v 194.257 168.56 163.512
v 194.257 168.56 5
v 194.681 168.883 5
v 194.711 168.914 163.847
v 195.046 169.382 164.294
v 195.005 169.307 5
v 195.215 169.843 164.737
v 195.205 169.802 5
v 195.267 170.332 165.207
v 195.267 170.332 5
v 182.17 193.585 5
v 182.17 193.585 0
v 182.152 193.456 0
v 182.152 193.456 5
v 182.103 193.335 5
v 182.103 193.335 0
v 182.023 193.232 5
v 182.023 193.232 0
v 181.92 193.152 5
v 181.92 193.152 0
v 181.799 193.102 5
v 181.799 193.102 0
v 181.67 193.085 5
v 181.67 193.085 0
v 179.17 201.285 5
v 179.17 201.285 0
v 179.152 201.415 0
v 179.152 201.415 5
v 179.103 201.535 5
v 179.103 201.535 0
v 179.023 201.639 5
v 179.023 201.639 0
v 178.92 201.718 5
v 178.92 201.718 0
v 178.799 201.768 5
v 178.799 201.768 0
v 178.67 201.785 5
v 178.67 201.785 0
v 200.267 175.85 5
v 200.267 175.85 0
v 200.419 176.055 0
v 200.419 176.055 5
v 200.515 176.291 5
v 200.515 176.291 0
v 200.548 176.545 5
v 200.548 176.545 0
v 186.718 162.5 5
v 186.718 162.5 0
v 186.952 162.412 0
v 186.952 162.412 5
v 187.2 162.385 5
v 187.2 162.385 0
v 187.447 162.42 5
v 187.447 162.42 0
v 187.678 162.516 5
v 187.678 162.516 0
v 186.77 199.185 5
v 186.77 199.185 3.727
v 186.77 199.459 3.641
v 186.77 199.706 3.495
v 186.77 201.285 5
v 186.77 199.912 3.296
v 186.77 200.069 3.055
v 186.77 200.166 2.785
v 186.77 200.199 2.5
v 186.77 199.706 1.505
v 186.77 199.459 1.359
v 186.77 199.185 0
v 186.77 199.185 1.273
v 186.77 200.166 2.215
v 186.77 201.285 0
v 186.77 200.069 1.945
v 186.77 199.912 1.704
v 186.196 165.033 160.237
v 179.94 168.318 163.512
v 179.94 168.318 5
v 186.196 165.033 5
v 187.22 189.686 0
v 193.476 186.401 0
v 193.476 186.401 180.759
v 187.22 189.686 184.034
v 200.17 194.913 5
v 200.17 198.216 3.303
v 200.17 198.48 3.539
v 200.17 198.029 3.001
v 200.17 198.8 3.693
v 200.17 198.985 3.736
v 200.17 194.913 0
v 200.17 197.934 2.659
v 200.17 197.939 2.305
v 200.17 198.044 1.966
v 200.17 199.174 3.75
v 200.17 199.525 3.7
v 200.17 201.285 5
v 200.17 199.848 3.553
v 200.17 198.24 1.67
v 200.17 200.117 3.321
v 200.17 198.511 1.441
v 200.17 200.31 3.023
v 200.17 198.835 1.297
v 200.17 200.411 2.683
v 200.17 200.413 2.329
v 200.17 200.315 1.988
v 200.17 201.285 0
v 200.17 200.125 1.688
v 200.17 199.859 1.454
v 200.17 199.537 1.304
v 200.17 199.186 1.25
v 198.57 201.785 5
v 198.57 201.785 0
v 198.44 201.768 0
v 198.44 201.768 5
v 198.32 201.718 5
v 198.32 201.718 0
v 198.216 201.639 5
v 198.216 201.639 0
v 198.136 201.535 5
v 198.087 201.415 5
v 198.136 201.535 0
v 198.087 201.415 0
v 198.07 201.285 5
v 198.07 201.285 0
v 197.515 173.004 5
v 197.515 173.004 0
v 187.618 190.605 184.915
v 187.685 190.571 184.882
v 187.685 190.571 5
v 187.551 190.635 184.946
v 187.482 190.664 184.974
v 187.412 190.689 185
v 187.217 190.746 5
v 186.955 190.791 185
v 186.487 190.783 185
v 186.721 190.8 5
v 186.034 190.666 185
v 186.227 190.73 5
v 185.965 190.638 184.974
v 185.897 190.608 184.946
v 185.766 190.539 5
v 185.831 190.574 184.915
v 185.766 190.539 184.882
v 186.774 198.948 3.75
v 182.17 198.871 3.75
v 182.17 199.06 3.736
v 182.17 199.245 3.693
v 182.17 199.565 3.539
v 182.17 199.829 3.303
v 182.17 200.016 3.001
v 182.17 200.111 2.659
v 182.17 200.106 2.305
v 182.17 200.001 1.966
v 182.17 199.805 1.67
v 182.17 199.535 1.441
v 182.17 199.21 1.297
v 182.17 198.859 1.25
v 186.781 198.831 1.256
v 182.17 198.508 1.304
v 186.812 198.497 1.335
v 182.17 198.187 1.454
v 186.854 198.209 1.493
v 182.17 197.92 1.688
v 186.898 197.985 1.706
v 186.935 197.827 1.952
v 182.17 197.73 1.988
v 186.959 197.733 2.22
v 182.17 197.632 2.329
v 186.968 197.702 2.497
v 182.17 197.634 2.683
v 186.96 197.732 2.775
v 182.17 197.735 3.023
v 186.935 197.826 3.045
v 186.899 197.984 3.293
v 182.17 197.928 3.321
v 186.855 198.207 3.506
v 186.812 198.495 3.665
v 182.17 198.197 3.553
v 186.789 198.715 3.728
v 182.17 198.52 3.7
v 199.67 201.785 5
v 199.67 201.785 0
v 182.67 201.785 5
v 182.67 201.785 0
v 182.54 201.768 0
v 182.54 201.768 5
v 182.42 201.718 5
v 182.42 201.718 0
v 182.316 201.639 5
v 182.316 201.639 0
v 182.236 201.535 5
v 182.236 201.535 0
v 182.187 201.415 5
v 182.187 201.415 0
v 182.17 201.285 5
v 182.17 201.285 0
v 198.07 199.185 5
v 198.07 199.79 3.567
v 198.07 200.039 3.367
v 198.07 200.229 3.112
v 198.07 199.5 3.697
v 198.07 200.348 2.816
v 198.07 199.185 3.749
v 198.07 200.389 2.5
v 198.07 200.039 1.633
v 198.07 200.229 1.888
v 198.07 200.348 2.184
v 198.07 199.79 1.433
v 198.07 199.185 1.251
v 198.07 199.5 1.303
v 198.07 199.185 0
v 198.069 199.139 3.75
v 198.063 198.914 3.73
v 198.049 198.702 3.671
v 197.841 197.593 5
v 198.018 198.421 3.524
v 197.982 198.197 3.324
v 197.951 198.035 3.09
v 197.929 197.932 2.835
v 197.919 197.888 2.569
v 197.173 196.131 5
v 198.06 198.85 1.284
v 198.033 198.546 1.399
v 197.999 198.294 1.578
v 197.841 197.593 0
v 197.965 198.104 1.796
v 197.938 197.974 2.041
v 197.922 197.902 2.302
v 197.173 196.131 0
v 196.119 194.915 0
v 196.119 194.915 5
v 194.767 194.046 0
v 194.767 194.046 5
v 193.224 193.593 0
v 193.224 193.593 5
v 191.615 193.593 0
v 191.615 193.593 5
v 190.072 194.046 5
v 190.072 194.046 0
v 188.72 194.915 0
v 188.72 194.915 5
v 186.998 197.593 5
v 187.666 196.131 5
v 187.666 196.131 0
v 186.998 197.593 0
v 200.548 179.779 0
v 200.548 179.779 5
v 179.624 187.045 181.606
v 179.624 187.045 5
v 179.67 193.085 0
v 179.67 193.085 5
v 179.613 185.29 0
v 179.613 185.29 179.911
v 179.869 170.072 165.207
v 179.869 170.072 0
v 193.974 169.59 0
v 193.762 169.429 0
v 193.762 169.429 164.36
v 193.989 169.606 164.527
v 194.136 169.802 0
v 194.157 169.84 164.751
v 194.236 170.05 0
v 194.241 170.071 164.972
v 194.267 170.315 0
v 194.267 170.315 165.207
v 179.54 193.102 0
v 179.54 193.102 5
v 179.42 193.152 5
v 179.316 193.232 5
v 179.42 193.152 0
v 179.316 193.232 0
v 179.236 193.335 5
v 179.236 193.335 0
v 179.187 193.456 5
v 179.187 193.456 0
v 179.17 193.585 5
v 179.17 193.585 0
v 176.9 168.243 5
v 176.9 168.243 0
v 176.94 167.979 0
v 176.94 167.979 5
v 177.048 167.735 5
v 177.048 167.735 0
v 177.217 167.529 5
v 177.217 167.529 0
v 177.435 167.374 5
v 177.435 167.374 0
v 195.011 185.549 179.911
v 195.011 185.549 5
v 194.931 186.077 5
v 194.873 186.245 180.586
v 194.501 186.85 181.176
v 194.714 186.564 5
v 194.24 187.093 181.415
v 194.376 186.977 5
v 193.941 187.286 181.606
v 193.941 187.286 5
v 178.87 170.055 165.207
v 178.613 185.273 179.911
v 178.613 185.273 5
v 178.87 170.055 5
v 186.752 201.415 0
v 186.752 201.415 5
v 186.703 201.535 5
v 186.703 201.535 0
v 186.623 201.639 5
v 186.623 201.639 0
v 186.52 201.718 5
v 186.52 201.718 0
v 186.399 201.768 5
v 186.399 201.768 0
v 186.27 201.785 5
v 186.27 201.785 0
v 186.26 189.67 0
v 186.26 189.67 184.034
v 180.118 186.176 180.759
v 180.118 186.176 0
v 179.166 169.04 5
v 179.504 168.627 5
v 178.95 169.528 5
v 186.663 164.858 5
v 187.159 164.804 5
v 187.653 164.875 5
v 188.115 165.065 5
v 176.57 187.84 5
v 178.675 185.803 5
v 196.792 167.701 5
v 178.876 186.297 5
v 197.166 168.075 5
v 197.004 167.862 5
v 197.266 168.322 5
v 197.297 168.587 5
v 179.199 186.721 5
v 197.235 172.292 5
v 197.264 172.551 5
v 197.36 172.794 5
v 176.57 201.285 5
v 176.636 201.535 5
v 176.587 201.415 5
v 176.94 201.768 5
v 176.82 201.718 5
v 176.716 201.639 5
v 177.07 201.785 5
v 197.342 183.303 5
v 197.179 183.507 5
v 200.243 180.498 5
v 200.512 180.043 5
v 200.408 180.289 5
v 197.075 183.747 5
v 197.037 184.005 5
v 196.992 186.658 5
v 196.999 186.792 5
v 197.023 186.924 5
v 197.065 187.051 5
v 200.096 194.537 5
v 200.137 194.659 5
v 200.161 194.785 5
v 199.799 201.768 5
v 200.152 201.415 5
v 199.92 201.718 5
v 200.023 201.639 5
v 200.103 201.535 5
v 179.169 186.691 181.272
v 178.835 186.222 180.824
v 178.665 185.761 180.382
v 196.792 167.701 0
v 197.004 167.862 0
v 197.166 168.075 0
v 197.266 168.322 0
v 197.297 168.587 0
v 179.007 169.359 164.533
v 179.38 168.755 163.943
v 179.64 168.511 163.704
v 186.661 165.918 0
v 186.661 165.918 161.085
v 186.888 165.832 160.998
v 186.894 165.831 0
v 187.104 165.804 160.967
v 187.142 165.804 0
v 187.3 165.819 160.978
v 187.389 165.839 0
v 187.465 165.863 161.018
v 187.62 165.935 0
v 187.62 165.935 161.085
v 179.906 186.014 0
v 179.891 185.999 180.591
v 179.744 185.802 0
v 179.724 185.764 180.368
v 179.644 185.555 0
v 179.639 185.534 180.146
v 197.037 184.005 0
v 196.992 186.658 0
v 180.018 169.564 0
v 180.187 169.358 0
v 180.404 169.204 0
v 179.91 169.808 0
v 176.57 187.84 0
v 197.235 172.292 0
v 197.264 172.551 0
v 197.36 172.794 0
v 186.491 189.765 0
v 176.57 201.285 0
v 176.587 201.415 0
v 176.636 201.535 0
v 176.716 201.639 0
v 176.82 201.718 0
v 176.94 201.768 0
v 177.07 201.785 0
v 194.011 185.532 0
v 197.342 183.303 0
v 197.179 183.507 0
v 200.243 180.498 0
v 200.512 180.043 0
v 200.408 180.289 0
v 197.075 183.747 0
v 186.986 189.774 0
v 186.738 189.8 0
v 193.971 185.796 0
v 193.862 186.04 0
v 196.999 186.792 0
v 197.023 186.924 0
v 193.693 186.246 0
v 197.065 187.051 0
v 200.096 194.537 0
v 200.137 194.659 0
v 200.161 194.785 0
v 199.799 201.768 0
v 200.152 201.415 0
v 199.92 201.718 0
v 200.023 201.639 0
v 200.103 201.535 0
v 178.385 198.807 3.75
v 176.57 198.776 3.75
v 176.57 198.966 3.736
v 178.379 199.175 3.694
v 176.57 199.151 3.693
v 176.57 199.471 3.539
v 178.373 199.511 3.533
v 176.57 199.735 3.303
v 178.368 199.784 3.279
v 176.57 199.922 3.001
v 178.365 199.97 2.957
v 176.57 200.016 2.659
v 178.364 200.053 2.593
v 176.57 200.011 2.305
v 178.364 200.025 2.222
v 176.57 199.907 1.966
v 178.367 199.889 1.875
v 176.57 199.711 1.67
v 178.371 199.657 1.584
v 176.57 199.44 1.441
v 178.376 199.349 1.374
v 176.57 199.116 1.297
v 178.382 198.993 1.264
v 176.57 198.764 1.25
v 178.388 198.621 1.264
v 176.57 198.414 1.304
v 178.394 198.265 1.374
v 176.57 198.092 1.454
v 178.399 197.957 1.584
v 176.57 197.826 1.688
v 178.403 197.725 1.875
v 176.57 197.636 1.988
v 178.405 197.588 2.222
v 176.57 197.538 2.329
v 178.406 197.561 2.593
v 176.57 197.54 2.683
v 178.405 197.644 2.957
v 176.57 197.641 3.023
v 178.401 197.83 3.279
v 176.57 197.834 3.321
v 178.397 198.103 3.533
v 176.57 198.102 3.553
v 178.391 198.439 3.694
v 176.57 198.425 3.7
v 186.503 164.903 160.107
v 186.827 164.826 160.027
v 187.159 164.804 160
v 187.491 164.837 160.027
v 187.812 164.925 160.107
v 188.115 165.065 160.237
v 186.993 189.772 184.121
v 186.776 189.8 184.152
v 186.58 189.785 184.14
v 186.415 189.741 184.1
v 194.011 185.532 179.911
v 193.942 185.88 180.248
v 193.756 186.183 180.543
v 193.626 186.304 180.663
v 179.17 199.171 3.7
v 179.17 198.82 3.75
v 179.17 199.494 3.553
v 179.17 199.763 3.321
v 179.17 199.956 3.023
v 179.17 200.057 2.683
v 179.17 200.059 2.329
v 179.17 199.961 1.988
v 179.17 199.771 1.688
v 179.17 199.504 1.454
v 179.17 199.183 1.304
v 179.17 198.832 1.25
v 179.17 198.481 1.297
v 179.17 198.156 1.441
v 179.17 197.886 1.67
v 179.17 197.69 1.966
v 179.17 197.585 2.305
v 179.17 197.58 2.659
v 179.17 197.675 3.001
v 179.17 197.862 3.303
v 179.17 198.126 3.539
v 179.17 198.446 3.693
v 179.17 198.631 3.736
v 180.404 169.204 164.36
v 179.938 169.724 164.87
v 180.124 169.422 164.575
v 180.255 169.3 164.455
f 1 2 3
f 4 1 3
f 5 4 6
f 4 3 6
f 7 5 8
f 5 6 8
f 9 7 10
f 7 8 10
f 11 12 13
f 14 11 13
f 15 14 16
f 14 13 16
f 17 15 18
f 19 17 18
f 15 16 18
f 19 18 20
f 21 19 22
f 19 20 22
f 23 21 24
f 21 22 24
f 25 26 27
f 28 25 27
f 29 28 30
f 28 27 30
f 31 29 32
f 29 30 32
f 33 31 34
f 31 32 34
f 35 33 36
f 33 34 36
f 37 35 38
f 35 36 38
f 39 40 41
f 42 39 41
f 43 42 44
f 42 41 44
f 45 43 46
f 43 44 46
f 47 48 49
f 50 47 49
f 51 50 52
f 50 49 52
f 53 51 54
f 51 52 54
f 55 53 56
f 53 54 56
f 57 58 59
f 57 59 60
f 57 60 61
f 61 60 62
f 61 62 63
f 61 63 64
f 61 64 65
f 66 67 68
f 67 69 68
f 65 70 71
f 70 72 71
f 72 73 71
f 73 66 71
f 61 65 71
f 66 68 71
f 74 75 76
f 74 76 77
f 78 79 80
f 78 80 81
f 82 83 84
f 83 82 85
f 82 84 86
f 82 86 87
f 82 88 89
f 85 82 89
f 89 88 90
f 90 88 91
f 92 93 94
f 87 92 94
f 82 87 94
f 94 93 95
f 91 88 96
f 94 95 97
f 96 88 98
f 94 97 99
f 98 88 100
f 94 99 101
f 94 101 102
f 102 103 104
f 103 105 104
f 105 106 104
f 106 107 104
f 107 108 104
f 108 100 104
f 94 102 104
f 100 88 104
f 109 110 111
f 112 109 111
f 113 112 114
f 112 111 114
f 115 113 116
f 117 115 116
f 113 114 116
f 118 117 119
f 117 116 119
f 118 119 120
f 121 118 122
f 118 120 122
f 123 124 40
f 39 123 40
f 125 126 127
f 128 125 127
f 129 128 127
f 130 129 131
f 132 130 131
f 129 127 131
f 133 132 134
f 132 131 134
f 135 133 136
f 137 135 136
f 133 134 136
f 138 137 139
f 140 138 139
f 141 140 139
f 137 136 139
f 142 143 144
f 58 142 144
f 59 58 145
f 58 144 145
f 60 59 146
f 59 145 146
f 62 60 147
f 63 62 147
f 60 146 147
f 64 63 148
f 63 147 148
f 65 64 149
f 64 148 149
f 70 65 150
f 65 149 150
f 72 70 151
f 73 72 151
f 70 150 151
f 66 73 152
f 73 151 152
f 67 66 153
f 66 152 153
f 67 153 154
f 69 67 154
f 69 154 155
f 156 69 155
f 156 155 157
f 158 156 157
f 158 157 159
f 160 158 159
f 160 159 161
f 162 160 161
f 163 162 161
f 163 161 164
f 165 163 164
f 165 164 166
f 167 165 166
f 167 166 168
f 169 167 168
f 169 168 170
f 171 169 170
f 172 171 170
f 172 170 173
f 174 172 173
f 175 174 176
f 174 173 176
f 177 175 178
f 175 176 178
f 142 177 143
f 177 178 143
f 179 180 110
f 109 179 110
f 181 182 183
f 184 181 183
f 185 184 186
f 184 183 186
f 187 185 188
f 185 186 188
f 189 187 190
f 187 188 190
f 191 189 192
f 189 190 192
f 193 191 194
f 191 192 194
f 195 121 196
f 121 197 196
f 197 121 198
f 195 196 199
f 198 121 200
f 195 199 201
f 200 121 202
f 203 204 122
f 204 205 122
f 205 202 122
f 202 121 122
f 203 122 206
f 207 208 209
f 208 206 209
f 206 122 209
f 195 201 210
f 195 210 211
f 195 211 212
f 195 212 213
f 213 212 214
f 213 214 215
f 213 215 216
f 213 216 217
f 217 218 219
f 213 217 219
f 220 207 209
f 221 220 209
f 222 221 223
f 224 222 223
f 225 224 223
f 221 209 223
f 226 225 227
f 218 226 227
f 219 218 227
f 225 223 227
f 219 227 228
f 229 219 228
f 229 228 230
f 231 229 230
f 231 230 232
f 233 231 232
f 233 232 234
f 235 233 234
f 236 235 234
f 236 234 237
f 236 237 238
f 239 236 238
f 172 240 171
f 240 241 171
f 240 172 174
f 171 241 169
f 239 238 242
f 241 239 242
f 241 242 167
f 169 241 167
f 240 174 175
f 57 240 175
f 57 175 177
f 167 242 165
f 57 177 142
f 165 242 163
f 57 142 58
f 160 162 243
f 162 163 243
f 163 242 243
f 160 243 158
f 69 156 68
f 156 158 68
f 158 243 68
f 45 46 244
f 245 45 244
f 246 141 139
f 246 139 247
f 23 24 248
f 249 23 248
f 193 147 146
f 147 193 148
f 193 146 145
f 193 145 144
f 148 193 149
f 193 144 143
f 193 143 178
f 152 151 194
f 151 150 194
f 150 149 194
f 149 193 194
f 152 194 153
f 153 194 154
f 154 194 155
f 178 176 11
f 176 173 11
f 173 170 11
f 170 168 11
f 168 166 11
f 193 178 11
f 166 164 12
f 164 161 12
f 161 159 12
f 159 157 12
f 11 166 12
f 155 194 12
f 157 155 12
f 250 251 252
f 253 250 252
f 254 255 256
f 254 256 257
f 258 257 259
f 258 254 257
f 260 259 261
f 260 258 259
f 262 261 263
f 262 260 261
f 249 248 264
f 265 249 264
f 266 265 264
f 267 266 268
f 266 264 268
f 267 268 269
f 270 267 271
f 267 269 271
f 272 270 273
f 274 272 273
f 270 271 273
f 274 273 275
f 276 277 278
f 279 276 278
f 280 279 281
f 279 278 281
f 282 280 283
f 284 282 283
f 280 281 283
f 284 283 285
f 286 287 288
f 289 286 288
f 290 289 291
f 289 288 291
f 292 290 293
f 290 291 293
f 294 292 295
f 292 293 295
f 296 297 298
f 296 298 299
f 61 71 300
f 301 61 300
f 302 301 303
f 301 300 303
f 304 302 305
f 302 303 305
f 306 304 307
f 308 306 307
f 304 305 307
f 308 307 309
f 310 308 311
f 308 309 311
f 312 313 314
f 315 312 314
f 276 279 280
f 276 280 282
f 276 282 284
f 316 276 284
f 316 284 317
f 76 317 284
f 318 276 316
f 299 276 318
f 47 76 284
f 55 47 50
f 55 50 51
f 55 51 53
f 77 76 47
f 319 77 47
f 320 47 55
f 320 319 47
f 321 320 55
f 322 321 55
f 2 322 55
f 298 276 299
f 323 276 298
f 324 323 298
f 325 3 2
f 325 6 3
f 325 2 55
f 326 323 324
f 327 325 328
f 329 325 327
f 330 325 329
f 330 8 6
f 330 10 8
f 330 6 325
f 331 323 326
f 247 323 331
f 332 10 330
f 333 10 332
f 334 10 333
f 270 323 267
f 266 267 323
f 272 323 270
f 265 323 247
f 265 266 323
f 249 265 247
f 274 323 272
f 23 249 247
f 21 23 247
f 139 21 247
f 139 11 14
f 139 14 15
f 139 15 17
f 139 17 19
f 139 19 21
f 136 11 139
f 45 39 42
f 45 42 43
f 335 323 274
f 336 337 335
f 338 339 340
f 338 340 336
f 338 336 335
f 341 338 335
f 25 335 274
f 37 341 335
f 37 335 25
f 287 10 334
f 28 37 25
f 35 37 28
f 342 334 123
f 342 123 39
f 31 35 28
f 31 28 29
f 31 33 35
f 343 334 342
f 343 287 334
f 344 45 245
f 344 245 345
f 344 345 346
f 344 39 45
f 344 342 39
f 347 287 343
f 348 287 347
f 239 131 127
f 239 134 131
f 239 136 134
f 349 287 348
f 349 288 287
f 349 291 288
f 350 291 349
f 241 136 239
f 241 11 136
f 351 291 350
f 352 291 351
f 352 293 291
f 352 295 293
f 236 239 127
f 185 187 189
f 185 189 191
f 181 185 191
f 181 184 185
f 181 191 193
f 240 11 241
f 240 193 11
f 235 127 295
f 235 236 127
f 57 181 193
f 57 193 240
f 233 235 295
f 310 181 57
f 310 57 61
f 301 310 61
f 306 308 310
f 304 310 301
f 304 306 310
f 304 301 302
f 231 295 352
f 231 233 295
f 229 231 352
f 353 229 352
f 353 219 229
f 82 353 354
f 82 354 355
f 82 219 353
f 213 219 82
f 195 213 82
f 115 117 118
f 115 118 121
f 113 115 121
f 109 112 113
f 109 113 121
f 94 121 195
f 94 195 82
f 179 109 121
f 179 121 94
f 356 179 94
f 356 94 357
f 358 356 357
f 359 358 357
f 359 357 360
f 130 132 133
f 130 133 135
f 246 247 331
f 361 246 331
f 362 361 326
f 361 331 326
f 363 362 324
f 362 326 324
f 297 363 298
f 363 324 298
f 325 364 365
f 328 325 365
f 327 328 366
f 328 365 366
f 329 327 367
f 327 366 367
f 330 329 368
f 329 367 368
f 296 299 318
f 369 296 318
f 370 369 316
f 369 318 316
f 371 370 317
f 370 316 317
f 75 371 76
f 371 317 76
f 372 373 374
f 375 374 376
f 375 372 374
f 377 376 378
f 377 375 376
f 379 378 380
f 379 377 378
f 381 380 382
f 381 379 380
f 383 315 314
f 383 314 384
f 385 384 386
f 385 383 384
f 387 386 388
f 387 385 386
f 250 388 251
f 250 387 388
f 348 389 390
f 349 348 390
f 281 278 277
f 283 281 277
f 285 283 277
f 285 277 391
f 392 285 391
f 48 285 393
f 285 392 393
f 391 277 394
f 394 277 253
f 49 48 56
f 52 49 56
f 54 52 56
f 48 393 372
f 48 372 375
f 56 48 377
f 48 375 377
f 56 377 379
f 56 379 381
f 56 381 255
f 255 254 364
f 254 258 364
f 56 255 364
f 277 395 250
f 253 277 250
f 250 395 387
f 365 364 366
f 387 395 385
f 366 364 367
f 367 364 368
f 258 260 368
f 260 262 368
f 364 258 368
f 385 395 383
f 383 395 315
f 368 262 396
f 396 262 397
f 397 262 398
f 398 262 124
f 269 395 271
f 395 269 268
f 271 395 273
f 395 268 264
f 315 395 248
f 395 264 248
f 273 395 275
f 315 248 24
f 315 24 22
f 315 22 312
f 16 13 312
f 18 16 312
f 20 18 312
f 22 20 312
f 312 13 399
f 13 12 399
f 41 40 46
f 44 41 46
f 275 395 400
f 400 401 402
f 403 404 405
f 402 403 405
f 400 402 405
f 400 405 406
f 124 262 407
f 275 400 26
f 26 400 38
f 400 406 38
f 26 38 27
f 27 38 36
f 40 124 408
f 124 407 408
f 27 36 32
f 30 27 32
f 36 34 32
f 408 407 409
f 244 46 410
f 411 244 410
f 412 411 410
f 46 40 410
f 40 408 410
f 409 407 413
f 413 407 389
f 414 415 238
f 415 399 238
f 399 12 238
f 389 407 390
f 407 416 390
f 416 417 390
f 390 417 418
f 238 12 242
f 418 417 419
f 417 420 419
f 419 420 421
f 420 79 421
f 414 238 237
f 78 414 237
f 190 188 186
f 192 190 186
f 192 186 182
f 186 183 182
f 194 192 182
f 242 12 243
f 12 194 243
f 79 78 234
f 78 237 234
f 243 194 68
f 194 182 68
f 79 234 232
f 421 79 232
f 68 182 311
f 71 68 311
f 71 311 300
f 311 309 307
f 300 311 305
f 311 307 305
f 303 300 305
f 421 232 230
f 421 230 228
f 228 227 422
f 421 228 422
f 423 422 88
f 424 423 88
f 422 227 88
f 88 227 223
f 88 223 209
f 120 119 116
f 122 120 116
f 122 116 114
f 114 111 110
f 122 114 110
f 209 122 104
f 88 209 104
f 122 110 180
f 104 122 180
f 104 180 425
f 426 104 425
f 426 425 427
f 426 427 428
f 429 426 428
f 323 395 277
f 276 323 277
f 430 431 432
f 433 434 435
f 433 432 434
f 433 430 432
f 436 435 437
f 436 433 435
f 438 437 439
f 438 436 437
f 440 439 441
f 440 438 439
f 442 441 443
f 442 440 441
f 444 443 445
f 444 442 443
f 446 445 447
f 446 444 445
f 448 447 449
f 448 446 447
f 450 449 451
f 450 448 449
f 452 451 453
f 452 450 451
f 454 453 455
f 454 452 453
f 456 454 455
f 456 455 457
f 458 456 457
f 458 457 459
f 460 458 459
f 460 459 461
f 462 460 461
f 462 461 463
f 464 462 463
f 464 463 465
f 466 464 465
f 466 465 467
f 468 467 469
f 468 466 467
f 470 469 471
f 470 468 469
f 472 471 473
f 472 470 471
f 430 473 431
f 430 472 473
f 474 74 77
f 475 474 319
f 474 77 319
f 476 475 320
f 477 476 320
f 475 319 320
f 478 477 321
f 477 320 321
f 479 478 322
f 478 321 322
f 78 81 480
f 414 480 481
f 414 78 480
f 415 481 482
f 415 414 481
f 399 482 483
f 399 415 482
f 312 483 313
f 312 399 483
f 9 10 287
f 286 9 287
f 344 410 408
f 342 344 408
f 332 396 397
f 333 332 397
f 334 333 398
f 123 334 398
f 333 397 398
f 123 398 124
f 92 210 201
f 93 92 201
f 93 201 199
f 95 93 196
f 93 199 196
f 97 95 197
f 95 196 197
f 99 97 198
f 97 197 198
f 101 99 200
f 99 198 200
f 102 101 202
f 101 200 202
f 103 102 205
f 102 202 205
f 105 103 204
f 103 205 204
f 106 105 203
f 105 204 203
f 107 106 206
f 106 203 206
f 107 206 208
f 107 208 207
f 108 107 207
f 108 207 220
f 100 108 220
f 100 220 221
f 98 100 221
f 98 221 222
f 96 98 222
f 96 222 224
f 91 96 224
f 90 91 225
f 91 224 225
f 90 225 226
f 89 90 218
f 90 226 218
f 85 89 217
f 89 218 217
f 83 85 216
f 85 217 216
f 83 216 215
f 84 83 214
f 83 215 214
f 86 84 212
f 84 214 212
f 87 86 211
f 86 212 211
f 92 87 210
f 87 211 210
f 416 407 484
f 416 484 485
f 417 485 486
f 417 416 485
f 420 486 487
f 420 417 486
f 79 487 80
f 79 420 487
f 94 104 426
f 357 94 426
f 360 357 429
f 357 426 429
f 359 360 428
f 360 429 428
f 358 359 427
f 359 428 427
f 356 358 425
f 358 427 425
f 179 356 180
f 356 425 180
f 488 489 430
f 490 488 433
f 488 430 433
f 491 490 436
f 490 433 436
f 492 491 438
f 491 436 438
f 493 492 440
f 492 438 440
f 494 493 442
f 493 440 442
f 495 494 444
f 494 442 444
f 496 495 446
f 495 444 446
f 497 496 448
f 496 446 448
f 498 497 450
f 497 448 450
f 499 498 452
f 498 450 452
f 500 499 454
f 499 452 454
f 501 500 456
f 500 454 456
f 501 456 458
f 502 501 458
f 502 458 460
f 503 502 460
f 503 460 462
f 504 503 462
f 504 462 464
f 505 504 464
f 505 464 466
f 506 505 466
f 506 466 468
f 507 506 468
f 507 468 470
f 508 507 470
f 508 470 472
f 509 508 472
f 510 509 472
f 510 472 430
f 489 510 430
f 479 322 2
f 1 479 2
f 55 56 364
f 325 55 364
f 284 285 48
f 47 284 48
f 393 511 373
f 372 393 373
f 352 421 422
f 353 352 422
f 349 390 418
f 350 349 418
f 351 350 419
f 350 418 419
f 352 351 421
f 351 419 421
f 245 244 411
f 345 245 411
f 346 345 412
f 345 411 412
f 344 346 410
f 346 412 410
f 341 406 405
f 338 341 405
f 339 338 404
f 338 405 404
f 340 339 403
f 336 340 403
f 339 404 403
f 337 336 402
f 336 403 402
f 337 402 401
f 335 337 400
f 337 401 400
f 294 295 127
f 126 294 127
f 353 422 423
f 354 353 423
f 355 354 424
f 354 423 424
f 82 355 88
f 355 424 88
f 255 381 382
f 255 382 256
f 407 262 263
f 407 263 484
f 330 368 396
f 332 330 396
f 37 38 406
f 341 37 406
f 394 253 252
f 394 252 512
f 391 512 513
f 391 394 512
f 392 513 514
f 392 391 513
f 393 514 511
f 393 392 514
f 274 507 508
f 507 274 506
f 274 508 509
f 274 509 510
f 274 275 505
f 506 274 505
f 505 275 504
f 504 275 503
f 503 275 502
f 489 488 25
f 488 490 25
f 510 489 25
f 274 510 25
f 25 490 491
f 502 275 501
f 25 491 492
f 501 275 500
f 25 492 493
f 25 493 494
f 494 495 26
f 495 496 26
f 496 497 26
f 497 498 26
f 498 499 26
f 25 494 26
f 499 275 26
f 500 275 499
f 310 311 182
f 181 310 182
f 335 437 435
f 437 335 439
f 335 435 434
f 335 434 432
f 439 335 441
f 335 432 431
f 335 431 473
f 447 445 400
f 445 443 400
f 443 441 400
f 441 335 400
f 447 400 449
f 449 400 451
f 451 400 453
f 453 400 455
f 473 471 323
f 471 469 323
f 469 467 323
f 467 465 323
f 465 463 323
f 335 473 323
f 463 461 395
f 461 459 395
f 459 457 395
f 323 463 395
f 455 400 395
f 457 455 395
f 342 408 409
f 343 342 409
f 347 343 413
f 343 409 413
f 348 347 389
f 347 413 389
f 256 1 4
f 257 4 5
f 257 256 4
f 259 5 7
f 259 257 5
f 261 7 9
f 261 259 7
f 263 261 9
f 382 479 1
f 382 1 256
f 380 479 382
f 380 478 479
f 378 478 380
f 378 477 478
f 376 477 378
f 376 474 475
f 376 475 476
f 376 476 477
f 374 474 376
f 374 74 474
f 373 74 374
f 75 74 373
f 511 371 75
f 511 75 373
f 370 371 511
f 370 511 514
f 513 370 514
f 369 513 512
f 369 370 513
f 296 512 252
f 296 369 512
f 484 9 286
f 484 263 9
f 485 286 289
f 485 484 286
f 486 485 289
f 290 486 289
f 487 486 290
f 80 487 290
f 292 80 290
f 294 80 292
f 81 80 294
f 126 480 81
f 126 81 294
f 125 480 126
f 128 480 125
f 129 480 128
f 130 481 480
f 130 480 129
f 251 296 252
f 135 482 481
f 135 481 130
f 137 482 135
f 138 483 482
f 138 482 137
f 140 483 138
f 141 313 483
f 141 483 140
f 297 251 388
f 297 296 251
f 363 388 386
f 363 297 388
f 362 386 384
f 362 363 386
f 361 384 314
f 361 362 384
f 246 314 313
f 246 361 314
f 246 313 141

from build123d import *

# Parameters (mm, degrees)
BOSS_EXTRUDE1_DEPTH     = 5
BOSS_EXTRUDE2_DEPTH     = 180
SKETCH3_R               = 1.25
CUT_EXTRUDE1_DEPTH      = 180
CUT_EXTRUDE1_DEPTH_BACK = 180


with BuildPart() as part:
    # Sketch1 → Boss-Extrude1 (new body)
    with BuildSketch(Plane.XY):
        with BuildLine():
            Line((176.569505492, 187.840095713), (176.899877953, 168.242969935))
            ThreePointArc((176.899877953, 168.242969935), (177.048290864, 167.735381874), (177.434829134, 167.374466097))
            Line((177.434829134, 167.374466097), (186.718316852, 162.499660601))
            ThreePointArc((186.718316852, 162.499660601), (187.200079416, 162.385162323), (187.67770885, 162.515834233))
            Line((187.67770885, 162.515834233), (196.791607056, 167.700786723))
            ThreePointArc((196.791607056, 167.700786723), (197.16576035, 168.074526398), (197.296979738, 168.586828559))
            Line((197.296979738, 168.586828559), (197.234516514, 172.292039484))
            ThreePointArc((197.234516514, 172.292039484), (197.304175726, 172.675951622), (197.515449261, 173.003982761))
            Line((197.515449261, 173.003982761), (200.266782587, 175.849671866))
            ThreePointArc((200.266782587, 175.849671866), (200.474929456, 176.169876136), (200.547857403, 176.544759328))
            Line((200.547857403, 176.544759328), (200.547857403, 179.779238985))
            ThreePointArc((200.547857403, 179.779238985), (200.468478786, 180.169695473), (200.242944865, 180.498164169))
            Line((200.242944865, 180.498164169), (197.341824739, 183.303090564))
            ThreePointArc((197.341824739, 183.303090564), (197.119614365, 183.623813941), (197.037054271, 184.005159933))
            Line((197.037054271, 184.005159933), (196.992324343, 186.658462241))
            ThreePointArc((196.992324343, 186.658462241), (197.009048268, 186.858204702), (197.065271311, 187.050599374))
            Line((197.065271311, 187.050599374), (200.096416454, 194.537254131))
            ThreePointArc((200.096416454, 194.537254131), (200.151063173, 194.721369242), (200.169505492, 194.912535449))
            Line((200.169505492, 194.912535449), (200.169505492, 201.285162323))
            ThreePointArc((200.169505492, 201.285162323), (200.023058882, 201.638715714), (199.669505492, 201.785162323))
            Line((199.669505492, 201.785162323), (198.569505492, 201.785162323))
            ThreePointArc((198.569505492, 201.785162323), (198.215952101, 201.638715714), (198.069505492, 201.285162323))
            Line((198.069505492, 201.285162323), (198.069505492, 199.185162323))
            ThreePointArc((198.069505492, 199.185162323), (192.419505492, 193.535162323), (186.769505492, 199.185162323))
            Line((186.769505492, 199.185162323), (186.769505492, 201.285162323))
            ThreePointArc((186.769505492, 201.285162323), (186.623058882, 201.638715714), (186.269505492, 201.785162323))
            Line((186.269505492, 201.785162323), (182.669505492, 201.785162323))
            ThreePointArc((182.669505492, 201.785162323), (182.315952101, 201.638715714), (182.169505492, 201.285162323))
            Line((182.169505492, 201.285162323), (182.169505492, 193.585162323))
            ThreePointArc((182.169505492, 193.585162323), (182.023058882, 193.231608933), (181.669505492, 193.085162323))
            Line((181.669505492, 193.085162323), (179.669505492, 193.085162323))
            ThreePointArc((179.669505492, 193.085162323), (179.315952101, 193.231608933), (179.169505492, 193.585162323))
            Line((179.169505492, 193.585162323), (179.169505492, 201.285162323))
            ThreePointArc((179.169505492, 201.285162323), (179.023058882, 201.638715714), (178.669505492, 201.785162323))
            Line((178.669505492, 201.785162323), (177.069505492, 201.785162323))
            ThreePointArc((177.069505492, 201.785162323), (176.715952101, 201.638715714), (176.569505492, 201.285162323))
            Line((176.569505492, 201.285162323), (176.569505492, 187.840095713))
        make_face()
        with BuildLine():
            Line((186.260276974, 189.669797845), (180.118302096, 186.175590732))
            ThreePointArc((180.118302096, 186.175590732), (179.744148802, 185.801851058), (179.612929414, 185.289548897))
            Line((179.612929414, 185.289548897), (179.869468758, 170.072076543))
            ThreePointArc((179.869468758, 170.072076543), (180.017881669, 169.564488482), (180.404419939, 169.203572705))
            Line((180.404419939, 169.203572705), (186.660683401, 165.918377698))
            ThreePointArc((186.660683401, 165.918377698), (187.142445966, 165.803879419), (187.6200754, 165.934551329))
            Line((187.6200754, 165.934551329), (193.762050278, 169.428758442))
            ThreePointArc((193.762050278, 169.428758442), (194.136203572, 169.802498117), (194.26742296, 170.314800278))
            Line((194.26742296, 170.314800278), (194.010883616, 185.532272632))
            ThreePointArc((194.010883616, 185.532272632), (193.862470704, 186.039860693), (193.475932435, 186.400776469))
            Line((193.475932435, 186.400776469), (187.219668972, 189.685971477))
            ThreePointArc((187.219668972, 189.685971477), (186.737906408, 189.800469755), (186.260276974, 189.669797845))
        make_face(mode=Mode.SUBTRACT)
    extrude(amount=BOSS_EXTRUDE1_DEPTH)

    # Sketch2 → Boss-Extrude2 (add)
    with BuildSketch(Plane.XY.offset(5)):
        with BuildLine():
            Line((185.765791725, 190.538983866), (179.623816847, 187.044776753))
            ThreePointArc((179.623816847, 187.044776753), (178.875510259, 186.297297404), (178.613071484, 185.272693082))
            Line((178.613071484, 185.272693082), (178.869610827, 170.055220728))
            ThreePointArc((178.869610827, 170.055220728), (179.16643665, 169.040044606), (179.93951319, 168.318213053))
            Line((179.93951319, 168.318213053), (186.195776652, 165.033018045))
            ThreePointArc((186.195776652, 165.033018045), (187.159301781, 164.804021489), (188.114560649, 165.065365309))
            Line((188.114560649, 165.065365309), (194.256535527, 168.559572421))
            ThreePointArc((194.256535527, 168.559572421), (195.004842115, 169.307051771), (195.26728089, 170.331656093))
            Line((195.26728089, 170.331656093), (195.010741546, 185.549128447))
            ThreePointArc((195.010741546, 185.549128447), (194.713915724, 186.564304569), (193.940839184, 187.286136122))
            Line((193.940839184, 187.286136122), (187.684575722, 190.57133113))
            ThreePointArc((187.684575722, 190.57133113), (186.721050593, 190.800327686), (185.765791725, 190.538983866))
        make_face()
        with BuildLine():
            Line((186.260276974, 189.669797845), (180.118302096, 186.175590732))
            ThreePointArc((180.118302096, 186.175590732), (179.744148802, 185.801851058), (179.612929414, 185.289548897))
            Line((179.612929414, 185.289548897), (179.869468758, 170.072076543))
            ThreePointArc((179.869468758, 170.072076543), (180.017881669, 169.564488482), (180.404419939, 169.203572705))
            Line((180.404419939, 169.203572705), (186.660683401, 165.918377698))
            ThreePointArc((186.660683401, 165.918377698), (187.142445966, 165.803879419), (187.6200754, 165.934551329))
            Line((187.6200754, 165.934551329), (193.762050278, 169.428758442))
            ThreePointArc((193.762050278, 169.428758442), (194.136203572, 169.802498117), (194.26742296, 170.314800278))
            Line((194.26742296, 170.314800278), (194.010883616, 185.532272632))
            ThreePointArc((194.010883616, 185.532272632), (193.862470704, 186.039860693), (193.475932435, 186.400776469))
            Line((193.475932435, 186.400776469), (187.219668972, 189.685971477))
            ThreePointArc((187.219668972, 189.685971477), (186.737906408, 189.800469755), (186.260276974, 189.669797845))
        make_face(mode=Mode.SUBTRACT)
    extrude(amount=BOSS_EXTRUDE2_DEPTH)

    # Sketch3 → Cut-Extrude1 (cut, two sides)
    with BuildSketch(Plane(origin=(181.684802759, 3.06288055, 0), x_dir=(0, 0, 1), z_dir=(-0.999857931, -0.016855815, 0))) as cut_extrude1_sk:
        with Locations((2.5, 195.771915061)):
            Circle(SKETCH3_R)
        Polygon((185, 187.503282827), (185, 161.625885339), (160, 161.625885339), align=None)
    extrude(amount=CUT_EXTRUDE1_DEPTH, mode=Mode.SUBTRACT)
    extrude(cut_extrude1_sk.sketch, amount=-CUT_EXTRUDE1_DEPTH_BACK, mode=Mode.SUBTRACT)


solid = part.part
